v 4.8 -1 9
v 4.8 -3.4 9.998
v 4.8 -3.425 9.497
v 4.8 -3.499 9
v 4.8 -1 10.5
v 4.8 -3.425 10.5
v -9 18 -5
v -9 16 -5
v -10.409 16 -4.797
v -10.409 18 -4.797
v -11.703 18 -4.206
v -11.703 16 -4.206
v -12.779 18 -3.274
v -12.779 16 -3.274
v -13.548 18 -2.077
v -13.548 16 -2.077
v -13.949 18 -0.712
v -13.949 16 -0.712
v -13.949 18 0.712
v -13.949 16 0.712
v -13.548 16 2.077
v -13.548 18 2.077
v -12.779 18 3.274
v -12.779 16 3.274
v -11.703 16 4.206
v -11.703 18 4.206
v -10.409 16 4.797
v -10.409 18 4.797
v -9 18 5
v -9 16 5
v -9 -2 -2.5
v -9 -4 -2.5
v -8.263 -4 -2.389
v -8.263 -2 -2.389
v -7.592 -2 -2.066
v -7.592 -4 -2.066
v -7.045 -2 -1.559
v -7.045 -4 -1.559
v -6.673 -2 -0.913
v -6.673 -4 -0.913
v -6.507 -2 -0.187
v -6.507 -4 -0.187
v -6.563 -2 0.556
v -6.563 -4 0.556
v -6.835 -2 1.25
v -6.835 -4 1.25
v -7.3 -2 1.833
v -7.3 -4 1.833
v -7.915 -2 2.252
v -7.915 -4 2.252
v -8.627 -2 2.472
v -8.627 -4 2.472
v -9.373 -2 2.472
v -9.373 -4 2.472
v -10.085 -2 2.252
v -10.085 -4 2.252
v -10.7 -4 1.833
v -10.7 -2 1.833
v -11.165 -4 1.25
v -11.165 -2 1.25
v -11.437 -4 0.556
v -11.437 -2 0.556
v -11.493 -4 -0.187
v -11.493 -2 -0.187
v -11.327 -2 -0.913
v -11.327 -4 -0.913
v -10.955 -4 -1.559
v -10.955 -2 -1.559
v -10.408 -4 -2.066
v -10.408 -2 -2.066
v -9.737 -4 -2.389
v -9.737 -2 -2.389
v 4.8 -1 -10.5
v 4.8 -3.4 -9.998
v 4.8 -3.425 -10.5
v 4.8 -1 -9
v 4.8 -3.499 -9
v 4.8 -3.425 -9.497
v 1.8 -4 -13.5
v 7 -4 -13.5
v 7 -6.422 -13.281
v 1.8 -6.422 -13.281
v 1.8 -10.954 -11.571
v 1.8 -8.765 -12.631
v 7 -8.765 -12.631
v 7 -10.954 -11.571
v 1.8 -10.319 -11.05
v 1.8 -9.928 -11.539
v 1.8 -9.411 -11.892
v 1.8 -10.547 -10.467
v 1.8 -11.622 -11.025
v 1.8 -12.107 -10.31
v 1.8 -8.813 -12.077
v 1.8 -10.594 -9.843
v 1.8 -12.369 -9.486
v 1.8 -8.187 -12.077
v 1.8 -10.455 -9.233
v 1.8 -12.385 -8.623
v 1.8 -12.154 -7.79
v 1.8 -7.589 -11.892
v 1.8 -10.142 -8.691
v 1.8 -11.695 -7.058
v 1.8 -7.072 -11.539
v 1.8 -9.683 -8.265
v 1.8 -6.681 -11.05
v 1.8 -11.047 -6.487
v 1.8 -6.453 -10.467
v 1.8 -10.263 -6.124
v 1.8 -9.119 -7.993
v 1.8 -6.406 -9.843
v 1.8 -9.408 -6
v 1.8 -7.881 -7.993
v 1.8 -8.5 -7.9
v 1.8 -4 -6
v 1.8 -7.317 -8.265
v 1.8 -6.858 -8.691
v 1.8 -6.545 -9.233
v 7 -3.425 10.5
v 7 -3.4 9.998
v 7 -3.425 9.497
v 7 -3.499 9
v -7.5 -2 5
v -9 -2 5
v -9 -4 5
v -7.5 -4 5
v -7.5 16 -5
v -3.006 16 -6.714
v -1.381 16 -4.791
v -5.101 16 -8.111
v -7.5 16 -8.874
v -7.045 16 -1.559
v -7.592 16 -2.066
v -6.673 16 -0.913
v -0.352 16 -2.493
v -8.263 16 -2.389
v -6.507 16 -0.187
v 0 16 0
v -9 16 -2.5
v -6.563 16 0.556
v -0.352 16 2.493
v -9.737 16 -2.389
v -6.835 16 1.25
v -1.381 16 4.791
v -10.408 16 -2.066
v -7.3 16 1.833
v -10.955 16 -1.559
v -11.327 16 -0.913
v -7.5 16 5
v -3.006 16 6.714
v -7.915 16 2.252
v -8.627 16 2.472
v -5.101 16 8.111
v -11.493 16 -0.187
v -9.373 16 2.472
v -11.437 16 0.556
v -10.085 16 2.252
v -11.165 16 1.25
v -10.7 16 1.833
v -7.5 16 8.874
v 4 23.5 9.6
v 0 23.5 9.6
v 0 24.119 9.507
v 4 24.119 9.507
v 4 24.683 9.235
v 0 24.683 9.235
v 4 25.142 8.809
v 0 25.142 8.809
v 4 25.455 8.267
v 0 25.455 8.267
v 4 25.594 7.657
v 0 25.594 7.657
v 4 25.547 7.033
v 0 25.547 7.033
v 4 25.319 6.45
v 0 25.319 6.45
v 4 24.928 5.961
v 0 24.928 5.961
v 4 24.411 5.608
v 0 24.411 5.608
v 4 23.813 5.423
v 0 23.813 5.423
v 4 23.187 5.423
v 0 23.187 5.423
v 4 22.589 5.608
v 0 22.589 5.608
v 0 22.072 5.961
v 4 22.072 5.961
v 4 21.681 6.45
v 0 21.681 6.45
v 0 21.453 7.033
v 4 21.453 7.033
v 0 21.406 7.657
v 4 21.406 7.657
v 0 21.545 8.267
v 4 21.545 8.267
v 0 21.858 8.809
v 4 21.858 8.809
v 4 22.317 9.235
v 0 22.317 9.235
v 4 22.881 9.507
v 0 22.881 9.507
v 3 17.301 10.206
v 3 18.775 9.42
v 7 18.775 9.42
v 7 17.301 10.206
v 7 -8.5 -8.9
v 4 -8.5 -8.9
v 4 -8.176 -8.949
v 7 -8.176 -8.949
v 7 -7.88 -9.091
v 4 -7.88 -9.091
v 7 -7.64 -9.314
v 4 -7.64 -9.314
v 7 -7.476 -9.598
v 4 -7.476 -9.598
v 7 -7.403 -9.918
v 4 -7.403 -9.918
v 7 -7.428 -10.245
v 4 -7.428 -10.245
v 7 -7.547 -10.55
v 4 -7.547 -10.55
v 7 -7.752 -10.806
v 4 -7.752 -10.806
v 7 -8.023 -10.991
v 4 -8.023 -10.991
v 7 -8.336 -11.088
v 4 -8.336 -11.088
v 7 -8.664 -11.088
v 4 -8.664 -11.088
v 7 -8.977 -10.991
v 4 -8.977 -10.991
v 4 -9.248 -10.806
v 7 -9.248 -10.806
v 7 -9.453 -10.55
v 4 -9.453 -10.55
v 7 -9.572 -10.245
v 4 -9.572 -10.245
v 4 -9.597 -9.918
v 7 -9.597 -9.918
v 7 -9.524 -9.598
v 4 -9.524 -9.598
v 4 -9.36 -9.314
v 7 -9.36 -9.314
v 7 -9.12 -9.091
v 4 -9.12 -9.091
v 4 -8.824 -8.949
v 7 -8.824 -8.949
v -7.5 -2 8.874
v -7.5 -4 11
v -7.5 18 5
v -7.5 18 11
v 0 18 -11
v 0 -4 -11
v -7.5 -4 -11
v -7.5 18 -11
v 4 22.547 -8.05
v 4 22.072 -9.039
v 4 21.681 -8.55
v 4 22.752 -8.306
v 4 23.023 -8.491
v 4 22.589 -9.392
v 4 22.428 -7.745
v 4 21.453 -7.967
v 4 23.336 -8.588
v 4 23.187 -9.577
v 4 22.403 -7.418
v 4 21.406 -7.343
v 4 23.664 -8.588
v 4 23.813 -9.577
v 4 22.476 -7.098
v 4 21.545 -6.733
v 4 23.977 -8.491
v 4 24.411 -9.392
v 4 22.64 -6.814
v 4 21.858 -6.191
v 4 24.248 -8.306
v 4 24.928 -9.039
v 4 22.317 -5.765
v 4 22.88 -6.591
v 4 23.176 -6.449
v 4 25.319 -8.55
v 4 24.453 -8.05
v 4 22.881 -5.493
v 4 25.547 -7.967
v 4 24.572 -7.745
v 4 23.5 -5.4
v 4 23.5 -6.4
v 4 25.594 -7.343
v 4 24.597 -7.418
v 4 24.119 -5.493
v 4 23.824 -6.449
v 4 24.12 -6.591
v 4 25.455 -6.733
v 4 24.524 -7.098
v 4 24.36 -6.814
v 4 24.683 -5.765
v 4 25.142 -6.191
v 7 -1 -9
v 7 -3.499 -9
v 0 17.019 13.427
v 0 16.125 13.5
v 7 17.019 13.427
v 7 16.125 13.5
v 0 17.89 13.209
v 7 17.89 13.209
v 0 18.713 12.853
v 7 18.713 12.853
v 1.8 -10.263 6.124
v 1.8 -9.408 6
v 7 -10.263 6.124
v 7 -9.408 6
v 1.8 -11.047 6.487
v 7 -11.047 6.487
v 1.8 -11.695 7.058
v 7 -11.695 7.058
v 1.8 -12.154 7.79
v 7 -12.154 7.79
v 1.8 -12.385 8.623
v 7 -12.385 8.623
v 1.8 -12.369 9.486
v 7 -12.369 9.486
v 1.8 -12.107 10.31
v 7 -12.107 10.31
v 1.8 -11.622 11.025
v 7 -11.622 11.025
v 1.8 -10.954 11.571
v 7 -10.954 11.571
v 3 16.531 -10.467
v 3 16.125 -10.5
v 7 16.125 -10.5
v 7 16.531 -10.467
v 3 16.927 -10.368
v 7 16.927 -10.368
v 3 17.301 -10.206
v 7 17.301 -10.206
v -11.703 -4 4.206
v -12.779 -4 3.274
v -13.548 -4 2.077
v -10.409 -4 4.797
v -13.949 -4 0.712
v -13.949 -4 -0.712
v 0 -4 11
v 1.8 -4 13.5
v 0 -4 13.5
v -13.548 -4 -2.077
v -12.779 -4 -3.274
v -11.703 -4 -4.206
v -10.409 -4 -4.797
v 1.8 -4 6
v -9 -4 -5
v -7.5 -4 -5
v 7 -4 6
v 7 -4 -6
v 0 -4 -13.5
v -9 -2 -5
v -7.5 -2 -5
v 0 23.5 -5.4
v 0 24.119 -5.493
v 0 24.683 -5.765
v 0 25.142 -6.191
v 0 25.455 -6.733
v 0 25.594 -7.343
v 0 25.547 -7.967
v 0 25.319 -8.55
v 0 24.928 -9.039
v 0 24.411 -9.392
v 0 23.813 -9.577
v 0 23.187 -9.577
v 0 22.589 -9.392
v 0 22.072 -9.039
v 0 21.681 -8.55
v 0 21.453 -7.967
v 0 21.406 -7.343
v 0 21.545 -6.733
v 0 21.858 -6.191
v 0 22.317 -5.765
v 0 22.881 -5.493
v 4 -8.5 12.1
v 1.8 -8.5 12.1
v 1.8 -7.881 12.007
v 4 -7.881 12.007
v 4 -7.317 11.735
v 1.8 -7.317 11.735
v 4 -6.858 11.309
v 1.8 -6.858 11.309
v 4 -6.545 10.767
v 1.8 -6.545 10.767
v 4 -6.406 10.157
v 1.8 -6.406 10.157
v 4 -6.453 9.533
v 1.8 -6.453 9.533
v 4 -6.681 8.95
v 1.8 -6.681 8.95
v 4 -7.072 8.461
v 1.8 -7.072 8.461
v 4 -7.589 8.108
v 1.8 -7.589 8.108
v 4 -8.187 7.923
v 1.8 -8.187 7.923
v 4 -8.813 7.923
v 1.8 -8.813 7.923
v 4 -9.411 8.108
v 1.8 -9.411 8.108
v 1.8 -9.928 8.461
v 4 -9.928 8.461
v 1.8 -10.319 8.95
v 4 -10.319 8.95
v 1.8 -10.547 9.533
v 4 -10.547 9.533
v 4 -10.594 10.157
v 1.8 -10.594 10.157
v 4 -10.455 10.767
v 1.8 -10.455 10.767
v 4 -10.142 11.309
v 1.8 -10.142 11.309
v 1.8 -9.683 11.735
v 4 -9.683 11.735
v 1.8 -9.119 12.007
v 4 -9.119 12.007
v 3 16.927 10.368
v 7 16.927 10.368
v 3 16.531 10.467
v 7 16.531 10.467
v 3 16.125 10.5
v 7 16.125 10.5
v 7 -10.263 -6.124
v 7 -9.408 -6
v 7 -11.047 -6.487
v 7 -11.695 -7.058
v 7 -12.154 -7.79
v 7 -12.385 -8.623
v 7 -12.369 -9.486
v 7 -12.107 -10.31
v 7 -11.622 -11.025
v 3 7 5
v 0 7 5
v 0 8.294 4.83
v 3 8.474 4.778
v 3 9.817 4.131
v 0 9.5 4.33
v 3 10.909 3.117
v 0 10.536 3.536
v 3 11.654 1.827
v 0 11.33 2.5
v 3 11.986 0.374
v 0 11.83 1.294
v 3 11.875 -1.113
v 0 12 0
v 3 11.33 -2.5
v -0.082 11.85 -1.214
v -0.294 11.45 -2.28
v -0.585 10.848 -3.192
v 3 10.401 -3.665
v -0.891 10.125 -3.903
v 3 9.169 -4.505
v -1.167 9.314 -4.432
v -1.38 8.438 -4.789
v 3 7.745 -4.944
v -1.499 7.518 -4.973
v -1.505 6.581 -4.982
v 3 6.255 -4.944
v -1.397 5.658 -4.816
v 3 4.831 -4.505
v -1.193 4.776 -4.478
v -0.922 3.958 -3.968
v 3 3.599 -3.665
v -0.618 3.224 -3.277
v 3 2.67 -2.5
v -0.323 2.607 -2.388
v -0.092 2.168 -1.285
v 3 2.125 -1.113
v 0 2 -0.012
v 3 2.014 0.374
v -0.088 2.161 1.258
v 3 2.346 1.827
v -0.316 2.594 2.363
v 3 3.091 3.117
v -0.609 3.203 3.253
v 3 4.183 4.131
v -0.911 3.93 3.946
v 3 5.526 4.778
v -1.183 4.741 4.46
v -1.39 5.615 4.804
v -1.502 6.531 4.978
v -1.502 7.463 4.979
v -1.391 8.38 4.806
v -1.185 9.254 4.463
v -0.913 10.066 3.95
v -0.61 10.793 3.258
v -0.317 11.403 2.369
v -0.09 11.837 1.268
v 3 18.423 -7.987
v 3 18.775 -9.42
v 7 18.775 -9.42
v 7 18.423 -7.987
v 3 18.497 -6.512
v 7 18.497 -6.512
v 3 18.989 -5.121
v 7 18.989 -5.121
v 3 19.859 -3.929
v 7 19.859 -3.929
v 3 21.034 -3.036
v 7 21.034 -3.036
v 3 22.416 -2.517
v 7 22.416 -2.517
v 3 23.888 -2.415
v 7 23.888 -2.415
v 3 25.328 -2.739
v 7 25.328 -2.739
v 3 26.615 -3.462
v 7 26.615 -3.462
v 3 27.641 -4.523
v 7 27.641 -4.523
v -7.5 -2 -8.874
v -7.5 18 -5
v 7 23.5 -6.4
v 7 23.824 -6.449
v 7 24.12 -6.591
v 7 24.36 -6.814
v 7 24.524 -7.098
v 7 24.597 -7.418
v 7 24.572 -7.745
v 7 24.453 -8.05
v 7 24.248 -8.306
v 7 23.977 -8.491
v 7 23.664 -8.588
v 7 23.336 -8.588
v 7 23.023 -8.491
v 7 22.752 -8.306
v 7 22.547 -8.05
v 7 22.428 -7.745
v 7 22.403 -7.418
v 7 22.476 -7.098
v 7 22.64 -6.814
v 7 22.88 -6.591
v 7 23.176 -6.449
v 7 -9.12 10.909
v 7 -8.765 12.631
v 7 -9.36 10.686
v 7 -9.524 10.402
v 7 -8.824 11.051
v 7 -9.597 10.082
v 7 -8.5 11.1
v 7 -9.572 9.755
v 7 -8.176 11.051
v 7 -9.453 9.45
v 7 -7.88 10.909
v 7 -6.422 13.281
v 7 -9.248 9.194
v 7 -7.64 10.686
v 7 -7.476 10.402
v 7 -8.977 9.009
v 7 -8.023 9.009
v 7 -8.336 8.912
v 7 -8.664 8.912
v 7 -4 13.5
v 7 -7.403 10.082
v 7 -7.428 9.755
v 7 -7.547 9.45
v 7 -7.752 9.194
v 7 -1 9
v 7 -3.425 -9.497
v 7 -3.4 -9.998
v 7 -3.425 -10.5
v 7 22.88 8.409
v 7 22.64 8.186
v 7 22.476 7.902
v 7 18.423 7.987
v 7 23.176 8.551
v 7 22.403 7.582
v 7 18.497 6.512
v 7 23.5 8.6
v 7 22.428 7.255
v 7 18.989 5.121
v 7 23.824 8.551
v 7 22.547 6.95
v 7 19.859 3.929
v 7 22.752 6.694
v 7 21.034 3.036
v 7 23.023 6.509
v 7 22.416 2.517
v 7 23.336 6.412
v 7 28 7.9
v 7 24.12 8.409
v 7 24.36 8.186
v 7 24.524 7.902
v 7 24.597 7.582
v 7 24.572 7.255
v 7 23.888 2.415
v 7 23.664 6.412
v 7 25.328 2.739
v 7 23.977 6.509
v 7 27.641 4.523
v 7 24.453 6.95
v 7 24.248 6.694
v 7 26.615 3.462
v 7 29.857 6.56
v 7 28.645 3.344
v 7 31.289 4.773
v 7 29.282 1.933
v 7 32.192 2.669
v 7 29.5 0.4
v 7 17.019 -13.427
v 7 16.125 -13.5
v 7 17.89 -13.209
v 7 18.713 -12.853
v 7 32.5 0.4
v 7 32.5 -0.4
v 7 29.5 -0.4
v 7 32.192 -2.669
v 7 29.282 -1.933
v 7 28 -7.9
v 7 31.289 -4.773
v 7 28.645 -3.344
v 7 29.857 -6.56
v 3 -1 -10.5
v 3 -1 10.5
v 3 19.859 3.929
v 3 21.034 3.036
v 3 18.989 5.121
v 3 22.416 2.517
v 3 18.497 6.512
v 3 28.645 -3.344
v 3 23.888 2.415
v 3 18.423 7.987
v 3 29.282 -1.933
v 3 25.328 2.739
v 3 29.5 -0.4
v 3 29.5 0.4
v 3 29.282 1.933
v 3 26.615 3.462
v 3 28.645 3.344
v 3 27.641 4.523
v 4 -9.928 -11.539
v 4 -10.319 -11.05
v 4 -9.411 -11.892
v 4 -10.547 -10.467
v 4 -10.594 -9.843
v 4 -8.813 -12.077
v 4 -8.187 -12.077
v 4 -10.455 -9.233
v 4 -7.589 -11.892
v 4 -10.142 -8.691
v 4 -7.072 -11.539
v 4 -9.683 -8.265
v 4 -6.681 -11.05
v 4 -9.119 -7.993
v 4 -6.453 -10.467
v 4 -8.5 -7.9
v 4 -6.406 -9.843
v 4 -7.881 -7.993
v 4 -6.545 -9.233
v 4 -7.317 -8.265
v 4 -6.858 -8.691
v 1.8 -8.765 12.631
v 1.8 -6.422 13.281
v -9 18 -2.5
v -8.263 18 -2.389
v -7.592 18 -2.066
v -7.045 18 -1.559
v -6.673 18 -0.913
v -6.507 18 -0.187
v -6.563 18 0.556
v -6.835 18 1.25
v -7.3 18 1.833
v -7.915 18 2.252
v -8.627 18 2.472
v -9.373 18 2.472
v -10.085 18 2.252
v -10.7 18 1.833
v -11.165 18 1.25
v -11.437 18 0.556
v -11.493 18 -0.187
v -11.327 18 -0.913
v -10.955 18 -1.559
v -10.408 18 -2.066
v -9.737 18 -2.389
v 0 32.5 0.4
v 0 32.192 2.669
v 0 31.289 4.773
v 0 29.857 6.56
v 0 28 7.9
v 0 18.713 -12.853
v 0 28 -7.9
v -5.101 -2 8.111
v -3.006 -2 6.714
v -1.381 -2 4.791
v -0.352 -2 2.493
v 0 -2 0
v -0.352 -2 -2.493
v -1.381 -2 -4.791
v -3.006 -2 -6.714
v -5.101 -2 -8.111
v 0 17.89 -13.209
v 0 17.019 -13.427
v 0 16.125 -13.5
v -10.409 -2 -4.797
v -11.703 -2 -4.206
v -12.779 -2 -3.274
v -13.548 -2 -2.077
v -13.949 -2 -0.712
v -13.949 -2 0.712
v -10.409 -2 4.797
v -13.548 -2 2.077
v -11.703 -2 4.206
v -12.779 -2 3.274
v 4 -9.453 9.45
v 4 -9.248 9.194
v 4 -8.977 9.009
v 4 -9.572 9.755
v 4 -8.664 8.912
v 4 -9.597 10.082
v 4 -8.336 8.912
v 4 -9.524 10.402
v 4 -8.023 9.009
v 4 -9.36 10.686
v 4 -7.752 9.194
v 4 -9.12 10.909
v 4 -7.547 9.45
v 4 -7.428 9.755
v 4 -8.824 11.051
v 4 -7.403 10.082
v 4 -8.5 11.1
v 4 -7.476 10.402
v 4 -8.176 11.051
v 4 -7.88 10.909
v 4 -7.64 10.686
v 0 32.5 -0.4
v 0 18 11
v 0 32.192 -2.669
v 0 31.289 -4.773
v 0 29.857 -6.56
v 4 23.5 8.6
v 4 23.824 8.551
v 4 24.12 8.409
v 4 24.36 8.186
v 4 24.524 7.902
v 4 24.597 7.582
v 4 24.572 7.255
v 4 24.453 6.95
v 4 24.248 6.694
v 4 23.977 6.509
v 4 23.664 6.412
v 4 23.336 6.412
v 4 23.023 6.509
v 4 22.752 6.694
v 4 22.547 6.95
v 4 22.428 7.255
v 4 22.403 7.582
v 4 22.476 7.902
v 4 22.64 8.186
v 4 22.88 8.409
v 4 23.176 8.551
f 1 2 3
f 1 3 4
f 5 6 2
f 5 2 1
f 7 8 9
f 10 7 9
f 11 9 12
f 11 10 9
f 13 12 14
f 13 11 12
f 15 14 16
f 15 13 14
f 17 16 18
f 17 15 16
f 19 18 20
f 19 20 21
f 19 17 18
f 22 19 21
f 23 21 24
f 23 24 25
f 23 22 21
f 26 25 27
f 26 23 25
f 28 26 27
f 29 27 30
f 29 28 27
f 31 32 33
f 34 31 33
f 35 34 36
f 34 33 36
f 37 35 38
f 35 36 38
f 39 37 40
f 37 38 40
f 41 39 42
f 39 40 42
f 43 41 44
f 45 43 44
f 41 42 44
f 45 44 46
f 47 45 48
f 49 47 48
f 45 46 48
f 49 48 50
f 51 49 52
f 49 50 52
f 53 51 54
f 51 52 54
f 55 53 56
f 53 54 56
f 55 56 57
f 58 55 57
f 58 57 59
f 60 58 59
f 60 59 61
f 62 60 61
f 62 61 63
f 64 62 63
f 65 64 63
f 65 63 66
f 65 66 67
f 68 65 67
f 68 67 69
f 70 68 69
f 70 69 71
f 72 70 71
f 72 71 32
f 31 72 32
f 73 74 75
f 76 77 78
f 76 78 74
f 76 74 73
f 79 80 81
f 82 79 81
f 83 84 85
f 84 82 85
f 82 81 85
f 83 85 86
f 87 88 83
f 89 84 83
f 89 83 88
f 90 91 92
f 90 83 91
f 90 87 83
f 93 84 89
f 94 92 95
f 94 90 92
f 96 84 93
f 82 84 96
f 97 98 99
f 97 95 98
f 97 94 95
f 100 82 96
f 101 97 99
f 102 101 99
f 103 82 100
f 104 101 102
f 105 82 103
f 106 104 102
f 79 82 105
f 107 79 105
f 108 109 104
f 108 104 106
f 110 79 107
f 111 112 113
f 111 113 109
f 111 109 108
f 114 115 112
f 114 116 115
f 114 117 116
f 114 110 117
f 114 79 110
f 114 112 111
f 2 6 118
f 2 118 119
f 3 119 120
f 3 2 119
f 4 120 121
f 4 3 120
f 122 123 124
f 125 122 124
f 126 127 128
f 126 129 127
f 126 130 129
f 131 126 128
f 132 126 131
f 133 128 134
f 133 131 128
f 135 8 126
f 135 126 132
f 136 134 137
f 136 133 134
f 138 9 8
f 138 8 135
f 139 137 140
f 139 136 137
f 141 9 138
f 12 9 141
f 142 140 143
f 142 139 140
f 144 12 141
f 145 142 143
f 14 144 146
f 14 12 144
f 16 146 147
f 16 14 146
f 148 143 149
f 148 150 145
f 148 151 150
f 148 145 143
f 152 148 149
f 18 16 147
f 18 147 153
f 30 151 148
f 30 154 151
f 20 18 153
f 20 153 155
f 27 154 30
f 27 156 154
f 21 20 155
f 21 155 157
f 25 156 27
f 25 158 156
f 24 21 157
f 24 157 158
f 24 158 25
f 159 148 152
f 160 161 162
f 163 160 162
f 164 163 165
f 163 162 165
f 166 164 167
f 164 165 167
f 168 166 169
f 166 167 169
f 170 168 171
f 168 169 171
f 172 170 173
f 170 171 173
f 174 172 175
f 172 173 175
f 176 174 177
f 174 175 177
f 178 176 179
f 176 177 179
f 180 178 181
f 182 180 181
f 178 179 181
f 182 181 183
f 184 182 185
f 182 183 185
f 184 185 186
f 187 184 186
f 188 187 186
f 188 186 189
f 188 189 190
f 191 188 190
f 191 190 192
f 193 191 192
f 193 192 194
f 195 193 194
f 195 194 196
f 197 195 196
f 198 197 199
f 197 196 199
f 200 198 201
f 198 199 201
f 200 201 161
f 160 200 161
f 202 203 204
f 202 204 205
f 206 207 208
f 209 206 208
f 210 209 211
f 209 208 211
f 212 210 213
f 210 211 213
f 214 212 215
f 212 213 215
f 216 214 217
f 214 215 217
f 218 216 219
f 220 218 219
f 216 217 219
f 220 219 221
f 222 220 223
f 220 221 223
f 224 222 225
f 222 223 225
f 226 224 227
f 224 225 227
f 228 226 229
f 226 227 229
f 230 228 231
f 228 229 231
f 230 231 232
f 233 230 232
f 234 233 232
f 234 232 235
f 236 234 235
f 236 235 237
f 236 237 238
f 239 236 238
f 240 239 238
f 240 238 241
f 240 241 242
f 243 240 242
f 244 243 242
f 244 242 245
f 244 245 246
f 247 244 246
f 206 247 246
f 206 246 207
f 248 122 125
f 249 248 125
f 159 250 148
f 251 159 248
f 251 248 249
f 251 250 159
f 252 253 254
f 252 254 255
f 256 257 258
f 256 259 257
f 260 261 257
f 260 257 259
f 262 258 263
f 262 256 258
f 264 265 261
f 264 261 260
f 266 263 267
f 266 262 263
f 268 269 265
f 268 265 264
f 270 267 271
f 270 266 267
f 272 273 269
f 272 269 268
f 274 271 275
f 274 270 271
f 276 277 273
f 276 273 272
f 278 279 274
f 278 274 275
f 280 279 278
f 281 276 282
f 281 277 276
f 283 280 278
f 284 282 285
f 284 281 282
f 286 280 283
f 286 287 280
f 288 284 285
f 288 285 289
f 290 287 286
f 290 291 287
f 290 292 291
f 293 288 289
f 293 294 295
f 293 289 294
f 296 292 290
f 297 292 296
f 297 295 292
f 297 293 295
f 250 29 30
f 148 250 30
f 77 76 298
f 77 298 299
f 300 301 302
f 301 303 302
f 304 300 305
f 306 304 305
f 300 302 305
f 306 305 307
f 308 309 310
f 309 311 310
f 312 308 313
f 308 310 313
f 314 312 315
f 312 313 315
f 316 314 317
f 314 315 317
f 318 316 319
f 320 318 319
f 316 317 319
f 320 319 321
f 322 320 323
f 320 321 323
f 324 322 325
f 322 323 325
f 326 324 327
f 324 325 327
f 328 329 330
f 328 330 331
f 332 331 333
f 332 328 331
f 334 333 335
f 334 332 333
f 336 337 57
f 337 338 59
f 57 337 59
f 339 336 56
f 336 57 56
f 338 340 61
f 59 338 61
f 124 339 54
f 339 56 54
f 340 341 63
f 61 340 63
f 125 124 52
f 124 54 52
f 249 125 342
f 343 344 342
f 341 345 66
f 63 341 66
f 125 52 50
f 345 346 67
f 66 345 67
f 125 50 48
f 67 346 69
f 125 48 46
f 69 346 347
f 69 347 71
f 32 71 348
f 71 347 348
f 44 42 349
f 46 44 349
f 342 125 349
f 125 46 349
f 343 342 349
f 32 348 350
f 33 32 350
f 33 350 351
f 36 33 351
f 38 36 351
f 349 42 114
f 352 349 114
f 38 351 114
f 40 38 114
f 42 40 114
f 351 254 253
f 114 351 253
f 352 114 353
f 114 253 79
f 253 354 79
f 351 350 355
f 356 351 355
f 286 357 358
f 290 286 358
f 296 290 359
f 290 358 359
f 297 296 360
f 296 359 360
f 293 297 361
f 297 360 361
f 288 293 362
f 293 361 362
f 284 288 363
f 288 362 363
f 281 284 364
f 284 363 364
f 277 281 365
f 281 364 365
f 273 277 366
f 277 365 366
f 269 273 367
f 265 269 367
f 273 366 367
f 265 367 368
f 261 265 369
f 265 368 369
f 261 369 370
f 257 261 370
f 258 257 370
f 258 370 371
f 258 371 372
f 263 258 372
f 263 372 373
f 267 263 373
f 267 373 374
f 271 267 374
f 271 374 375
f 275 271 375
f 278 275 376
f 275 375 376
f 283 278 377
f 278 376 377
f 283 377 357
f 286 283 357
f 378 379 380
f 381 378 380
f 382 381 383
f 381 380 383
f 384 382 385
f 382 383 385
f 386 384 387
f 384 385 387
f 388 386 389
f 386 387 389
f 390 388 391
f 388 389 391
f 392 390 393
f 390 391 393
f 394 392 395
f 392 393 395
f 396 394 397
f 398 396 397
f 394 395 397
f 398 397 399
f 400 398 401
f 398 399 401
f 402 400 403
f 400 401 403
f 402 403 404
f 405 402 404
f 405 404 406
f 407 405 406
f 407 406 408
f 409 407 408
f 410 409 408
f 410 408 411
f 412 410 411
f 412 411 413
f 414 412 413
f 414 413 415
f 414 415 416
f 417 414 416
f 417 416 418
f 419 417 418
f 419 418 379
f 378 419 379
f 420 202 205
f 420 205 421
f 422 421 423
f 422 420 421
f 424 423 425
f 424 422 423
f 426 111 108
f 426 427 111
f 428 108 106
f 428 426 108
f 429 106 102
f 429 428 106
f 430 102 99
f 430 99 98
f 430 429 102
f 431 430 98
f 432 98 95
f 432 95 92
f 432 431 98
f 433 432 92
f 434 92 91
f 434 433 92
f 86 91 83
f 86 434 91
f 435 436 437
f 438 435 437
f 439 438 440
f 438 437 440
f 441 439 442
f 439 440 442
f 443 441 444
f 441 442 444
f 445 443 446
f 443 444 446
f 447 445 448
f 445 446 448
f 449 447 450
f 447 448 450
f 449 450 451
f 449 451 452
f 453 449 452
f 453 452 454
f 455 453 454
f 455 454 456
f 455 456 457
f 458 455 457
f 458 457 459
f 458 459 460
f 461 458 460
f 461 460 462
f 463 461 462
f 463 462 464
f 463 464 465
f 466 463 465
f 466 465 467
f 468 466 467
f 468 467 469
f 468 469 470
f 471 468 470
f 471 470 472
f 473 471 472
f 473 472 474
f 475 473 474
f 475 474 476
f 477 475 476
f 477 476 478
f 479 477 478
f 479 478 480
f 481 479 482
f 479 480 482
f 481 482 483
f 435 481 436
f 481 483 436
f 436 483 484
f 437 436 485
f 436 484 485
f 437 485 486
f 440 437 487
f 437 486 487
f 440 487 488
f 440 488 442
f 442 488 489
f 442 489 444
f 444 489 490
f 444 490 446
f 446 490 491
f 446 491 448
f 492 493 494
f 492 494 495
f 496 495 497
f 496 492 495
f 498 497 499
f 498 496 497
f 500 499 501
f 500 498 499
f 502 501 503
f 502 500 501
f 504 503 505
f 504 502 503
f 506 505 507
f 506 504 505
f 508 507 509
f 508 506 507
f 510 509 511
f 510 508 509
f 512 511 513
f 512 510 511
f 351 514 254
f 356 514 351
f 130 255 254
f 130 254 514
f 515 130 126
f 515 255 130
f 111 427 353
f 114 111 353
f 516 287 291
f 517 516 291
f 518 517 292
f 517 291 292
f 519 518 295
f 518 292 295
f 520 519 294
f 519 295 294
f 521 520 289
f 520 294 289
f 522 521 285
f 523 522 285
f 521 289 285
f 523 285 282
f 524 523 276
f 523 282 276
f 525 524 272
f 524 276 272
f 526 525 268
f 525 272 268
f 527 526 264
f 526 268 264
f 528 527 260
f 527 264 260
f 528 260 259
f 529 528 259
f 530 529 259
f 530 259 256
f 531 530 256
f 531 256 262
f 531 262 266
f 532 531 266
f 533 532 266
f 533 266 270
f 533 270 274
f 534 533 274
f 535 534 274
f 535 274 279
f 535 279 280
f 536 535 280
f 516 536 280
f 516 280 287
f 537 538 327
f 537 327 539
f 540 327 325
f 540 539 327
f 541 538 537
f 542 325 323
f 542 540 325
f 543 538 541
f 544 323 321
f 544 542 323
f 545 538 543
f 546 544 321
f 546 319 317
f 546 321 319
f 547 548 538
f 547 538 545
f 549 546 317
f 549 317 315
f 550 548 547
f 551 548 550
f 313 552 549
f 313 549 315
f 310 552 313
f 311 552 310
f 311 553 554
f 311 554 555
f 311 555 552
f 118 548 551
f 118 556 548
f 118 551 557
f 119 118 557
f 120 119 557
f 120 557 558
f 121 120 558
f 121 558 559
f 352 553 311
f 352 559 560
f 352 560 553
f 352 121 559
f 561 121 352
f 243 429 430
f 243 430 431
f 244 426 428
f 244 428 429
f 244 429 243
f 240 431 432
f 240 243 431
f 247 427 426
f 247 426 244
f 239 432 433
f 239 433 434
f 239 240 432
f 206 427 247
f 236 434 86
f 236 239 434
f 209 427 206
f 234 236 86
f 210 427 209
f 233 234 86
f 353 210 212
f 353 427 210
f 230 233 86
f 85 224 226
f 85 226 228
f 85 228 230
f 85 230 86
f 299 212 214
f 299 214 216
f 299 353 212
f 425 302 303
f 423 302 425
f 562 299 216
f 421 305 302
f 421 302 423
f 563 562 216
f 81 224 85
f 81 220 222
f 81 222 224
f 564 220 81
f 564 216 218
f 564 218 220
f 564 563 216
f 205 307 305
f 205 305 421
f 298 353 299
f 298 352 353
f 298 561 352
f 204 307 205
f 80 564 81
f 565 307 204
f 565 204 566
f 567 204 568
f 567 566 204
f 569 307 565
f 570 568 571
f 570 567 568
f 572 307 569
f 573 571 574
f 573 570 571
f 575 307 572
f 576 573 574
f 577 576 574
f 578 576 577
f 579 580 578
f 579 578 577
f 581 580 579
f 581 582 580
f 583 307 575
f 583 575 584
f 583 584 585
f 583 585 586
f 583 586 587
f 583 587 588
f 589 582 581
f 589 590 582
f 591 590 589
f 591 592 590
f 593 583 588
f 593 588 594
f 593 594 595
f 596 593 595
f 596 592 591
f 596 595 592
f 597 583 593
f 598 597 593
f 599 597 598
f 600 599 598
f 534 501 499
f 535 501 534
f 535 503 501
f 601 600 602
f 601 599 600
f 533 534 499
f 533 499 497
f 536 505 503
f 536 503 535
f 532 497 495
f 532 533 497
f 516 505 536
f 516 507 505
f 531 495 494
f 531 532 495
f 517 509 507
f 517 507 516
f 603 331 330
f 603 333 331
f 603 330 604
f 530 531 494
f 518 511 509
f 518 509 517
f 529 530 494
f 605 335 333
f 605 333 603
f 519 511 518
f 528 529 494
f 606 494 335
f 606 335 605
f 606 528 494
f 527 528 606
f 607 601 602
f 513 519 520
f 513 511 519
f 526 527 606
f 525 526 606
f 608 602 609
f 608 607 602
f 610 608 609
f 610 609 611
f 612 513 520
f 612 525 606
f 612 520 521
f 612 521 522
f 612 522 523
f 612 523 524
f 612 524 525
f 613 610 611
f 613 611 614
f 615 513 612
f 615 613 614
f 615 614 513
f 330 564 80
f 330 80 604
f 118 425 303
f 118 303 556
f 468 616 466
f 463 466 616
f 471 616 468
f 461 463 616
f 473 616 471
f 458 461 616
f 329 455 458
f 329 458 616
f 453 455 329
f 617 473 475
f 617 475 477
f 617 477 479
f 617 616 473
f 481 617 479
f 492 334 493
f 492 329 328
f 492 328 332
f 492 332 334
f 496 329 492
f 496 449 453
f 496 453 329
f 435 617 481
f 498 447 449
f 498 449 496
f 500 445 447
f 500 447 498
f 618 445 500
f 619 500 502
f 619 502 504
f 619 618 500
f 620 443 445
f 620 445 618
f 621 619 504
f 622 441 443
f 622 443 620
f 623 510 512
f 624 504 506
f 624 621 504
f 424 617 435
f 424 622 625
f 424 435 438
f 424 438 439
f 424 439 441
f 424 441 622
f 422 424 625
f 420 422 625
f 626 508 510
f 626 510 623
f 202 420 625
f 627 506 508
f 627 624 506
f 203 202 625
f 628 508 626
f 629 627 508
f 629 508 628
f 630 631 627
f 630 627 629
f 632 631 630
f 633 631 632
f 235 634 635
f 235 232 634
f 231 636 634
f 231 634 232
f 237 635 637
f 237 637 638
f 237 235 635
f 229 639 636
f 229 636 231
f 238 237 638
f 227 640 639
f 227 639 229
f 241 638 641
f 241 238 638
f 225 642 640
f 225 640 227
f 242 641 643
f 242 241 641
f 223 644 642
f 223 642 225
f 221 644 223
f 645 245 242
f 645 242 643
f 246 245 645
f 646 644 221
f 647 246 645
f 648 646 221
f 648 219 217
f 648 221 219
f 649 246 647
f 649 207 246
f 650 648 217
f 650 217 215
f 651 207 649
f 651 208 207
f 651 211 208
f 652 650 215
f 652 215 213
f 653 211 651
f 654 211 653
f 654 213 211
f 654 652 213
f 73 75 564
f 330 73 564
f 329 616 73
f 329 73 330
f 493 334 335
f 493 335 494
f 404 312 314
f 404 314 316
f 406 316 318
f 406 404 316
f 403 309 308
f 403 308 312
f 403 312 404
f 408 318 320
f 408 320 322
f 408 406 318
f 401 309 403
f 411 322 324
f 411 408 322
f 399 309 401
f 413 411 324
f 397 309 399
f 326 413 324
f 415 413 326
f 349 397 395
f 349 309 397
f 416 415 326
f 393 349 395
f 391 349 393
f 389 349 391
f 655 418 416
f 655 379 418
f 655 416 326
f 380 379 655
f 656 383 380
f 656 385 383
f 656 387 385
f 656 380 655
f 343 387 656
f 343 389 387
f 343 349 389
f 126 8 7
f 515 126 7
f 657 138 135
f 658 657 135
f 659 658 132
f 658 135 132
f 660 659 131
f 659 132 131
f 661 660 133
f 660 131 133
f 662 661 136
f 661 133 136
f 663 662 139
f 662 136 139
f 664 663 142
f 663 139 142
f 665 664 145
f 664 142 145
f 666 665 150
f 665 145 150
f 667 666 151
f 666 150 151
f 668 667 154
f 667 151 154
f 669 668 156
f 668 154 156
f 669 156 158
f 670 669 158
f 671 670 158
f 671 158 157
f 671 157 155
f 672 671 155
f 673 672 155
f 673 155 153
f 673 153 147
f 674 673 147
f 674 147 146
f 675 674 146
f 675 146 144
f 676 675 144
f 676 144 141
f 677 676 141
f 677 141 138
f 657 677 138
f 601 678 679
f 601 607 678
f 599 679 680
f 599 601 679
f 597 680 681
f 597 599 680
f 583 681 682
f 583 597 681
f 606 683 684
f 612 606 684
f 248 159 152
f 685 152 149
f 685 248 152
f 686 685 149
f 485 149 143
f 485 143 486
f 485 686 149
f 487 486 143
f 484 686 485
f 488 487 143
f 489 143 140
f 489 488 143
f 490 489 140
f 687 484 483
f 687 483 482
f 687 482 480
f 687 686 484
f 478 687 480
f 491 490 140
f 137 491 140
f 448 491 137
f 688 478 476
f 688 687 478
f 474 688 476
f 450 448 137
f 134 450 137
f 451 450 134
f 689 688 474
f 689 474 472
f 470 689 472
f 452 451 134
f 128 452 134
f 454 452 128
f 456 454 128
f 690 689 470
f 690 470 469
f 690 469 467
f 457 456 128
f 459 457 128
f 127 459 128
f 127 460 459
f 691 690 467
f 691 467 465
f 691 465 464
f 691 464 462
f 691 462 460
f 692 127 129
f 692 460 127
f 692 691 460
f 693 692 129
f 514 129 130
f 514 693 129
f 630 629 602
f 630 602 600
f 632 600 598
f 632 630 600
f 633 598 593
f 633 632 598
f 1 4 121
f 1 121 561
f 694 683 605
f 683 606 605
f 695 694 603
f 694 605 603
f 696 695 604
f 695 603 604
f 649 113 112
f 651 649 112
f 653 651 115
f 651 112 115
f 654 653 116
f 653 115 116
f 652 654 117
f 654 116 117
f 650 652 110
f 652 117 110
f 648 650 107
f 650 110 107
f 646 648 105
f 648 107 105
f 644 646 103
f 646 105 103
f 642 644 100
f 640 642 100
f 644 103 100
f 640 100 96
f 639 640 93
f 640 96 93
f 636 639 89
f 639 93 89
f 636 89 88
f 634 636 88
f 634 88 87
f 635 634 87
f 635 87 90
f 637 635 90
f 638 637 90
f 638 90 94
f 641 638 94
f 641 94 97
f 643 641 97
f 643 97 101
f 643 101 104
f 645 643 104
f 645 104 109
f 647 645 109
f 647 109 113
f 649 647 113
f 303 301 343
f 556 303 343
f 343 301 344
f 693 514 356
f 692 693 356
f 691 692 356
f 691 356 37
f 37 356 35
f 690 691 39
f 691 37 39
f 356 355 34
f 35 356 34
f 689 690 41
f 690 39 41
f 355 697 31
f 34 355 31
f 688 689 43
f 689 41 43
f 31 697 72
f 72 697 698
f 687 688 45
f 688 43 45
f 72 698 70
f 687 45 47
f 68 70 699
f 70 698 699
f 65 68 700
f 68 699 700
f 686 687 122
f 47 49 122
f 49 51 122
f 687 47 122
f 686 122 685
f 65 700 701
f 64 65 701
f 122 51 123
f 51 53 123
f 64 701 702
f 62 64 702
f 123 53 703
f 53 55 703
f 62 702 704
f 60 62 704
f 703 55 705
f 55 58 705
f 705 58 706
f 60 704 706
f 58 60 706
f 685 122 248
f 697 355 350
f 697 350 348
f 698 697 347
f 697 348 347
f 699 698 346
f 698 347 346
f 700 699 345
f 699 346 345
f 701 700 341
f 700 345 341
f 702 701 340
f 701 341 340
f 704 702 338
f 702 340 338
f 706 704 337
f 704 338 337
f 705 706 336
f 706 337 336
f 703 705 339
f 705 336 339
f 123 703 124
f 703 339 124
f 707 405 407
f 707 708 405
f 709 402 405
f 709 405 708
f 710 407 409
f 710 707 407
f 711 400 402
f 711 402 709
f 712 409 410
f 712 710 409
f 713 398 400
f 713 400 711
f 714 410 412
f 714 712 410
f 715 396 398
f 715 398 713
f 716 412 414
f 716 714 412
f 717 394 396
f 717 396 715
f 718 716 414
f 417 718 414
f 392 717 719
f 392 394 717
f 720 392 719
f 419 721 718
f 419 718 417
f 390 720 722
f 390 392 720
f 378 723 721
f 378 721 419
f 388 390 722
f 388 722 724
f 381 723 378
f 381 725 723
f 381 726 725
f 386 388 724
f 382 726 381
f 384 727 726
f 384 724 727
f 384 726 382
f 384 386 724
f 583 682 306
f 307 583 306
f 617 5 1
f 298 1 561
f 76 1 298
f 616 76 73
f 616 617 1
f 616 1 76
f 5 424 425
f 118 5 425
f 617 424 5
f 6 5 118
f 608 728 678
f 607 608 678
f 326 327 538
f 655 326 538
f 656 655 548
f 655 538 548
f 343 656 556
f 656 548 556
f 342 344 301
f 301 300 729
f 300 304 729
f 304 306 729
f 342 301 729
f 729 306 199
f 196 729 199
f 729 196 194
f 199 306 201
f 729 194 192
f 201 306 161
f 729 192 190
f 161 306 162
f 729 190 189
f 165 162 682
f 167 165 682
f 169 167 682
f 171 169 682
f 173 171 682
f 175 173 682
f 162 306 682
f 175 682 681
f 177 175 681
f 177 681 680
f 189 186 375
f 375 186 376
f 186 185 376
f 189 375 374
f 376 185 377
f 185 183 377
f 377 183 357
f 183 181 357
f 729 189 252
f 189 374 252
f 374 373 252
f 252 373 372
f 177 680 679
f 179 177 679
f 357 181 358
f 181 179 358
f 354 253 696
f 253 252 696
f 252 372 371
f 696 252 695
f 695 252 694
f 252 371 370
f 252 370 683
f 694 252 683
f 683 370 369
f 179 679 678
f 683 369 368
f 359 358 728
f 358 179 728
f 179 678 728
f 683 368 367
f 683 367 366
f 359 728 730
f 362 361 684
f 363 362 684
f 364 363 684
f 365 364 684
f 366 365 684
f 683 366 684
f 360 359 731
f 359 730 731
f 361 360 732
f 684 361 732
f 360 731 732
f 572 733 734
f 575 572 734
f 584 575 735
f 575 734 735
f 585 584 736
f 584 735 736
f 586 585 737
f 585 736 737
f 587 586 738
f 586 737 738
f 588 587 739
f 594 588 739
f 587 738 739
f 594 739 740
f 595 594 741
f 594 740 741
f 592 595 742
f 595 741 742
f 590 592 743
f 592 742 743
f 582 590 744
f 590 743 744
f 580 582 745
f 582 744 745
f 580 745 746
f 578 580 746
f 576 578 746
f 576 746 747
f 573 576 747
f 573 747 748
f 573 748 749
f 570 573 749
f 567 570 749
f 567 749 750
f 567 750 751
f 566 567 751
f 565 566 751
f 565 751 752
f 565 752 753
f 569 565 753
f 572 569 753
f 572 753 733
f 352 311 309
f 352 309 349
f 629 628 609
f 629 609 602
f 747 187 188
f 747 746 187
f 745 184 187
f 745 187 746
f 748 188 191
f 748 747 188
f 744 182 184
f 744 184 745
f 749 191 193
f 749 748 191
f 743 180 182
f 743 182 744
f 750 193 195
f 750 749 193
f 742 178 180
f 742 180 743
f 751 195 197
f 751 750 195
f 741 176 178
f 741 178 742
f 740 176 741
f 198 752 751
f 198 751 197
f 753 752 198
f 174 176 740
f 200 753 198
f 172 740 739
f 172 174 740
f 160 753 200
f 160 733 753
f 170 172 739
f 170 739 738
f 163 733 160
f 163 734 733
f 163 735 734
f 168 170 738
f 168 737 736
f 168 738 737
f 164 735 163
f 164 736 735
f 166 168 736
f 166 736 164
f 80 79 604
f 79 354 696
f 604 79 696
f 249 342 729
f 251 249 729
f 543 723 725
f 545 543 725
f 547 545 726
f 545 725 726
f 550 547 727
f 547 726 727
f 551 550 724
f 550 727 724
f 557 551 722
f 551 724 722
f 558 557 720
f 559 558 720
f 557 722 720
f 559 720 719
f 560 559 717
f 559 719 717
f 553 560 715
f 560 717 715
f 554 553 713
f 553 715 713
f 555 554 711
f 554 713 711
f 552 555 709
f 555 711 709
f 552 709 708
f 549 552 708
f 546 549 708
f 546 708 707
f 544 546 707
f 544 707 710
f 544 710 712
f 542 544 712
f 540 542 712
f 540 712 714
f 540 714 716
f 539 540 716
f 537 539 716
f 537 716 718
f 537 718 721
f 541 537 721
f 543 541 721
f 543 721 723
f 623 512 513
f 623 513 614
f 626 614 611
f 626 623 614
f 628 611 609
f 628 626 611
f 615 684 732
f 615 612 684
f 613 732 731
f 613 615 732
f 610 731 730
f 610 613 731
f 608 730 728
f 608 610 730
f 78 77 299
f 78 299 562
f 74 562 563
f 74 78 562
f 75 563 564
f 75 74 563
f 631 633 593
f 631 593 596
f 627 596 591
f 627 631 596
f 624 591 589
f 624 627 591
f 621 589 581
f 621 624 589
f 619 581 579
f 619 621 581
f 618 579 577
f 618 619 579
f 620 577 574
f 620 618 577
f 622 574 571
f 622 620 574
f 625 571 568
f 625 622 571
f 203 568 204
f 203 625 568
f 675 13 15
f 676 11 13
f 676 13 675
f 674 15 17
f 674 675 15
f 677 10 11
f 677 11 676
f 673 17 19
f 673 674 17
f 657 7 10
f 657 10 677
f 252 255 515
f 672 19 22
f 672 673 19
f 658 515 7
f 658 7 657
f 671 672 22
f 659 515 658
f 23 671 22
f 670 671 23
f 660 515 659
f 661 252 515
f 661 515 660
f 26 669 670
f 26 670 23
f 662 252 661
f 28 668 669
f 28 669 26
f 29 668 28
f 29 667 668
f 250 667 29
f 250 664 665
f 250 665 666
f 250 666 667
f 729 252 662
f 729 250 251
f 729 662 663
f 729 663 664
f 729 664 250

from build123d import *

# Parameters (mm, degrees)
BOSS_EXTRUDE1_DEPTH                  = 7
FILLET1_R                            = 8.5
FILLET2_R                            = 5.5
FILLET3_R                            = 13.5
SKETCH3_W                            = 27
SKETCH3_H                            = 13.5
CUT_EXTRUDE1_DEPTH                   = 1.8
CUT_EXTRUDE5_REACH                   = 37.882
SKETCH12_W                           = 12
SKETCH12_H                           = 13.5
CUT_EXTRUDE6_REACH                   = 37.882
SKETCH13_R                           = 1.1
SKETCH17_R                           = 2.1
CUT_EXTRUDE14_DEPTH                  = 4
FILLET4_R                            = 3
SHELL2_START                         = 3
SHELL2_DEPTH                         = 4
SHELL2_START_2                       = 4.8
SHELL2_2_DEPTH                       = 2.2
SKETCH18_W                           = 22
SKETCH18_H                           = 22
BOSS_EXTRUDE2_DEPTH                  = 9
SKETCH19_W                           = 18
SKETCH19_H                           = 18
CUT_EXTRUDE15_DEPTH                  = 9
SKETCH20_R                           = 5
CUT_EXTRUDE16_DEPTH                  = 3
FILLET5_R                            = 9
SKETCH21_R                           = 5
BOSS_EXTRUDE3_DEPTH                  = 2
CUT_EXTRUDE17_DEPTH                  = 1.5
CUT_EXTRUDE17_DIRECTION_2_REACH      = 40.659
CUT_EXTRUDE17_DIRECTION_2_END_RADIUS = 5
CUT_EXTRUDE18_REACH                  = 43.358
SKETCH23_R                           = 2.5


# Read off the part's stored shape, not the designer's step: Shell2
# Some blends are built 0.0001 mm under size
with BuildPart() as part:
    # Sketch2 → Boss-Extrude1 (new body)
    with BuildSketch(Plane(origin=(0, 0, 0), x_dir=(0, 0, -1), z_dir=(1, 0, 0))):
        Polygon((-13.5, -17.5), (13.5, -17.5), (13.5, 17.5), (5.5, 32.5), (-5.5, 32.5), (-13.5, 17.5), align=None)
    extrude(amount=BOSS_EXTRUDE1_DEPTH)

    # Fillet1
    fillet1_edges = [part.edges().sort_by_distance(p)[0] for p in [
        (3.5, 32.5, 5.5),
        (3.5, 32.5, -5.5),
    ]]
    fillet(fillet1_edges, radius=FILLET1_R)

    # Fillet2
    fillet2_edges = [part.edges().sort_by_distance(p)[0] for p in [
        (3.5, 17.5, -13.5),
        (3.5, 17.5, 13.5),
    ]]
    fillet(fillet2_edges, radius=FILLET2_R)

    # Fillet3
    fillet3_edges = [part.edges().sort_by_distance(p)[0] for p in [
        (3.5, -17.5, 13.5),
        (3.5, -17.5, -13.5),
    ]]
    fillet(fillet3_edges, radius=FILLET3_R - 0.0001)  # a hair under: the kernel refuses the full size

    # Sketch3 → Cut-Extrude1 (cut)
    with BuildSketch(Plane.ZY):
        with Locations((0, -10.75)):
            Rectangle(SKETCH3_W, SKETCH3_H)
    extrude(amount=-CUT_EXTRUDE1_DEPTH, mode=Mode.SUBTRACT)

    # Sketch12 → Cut-Extrude5 (cut, up to next)
    with BuildSketch(Plane(origin=(7, 0, 0), x_dir=(0, 0, -1), z_dir=(1, 0, 0)), mode=Mode.PRIVATE) as cut_extrude5_sk1:
        with Locations((0, -10.75)):
            Rectangle(SKETCH12_W, SKETCH12_H)
    cut_extrude5_tool1 = extrude(cut_extrude5_sk1.sketch, amount=-CUT_EXTRUDE5_REACH, mode=Mode.PRIVATE) & part.part
    add(cut_extrude5_tool1.solids().sort_by_distance((7, -10.75, 0))[0], mode=Mode.SUBTRACT)

    # Sketch13 → Cut-Extrude6 (cut, up to next)
    with BuildSketch(Plane.ZY, mode=Mode.PRIVATE) as cut_extrude6_sk1:
        with Locations((-7.5, 23.5)):
            Circle(SKETCH13_R)
    cut_extrude6_tool1 = extrude(cut_extrude6_sk1.sketch, amount=-CUT_EXTRUDE6_REACH, mode=Mode.PRIVATE) & part.part
    # Sketch13 → Cut-Extrude6 (cut, up to next)
    with BuildSketch(Plane.ZY, mode=Mode.PRIVATE) as cut_extrude6_sk2:
        with Locations((-10, -8.5)):
            Circle(SKETCH13_R)
    cut_extrude6_tool2 = extrude(cut_extrude6_sk2.sketch, amount=-CUT_EXTRUDE6_REACH, mode=Mode.PRIVATE) & part.part
    # Sketch13 → Cut-Extrude6 (cut, up to next)
    with BuildSketch(Plane.ZY, mode=Mode.PRIVATE) as cut_extrude6_sk3:
        with Locations((10, -8.5)):
            Circle(SKETCH13_R)
    cut_extrude6_tool3 = extrude(cut_extrude6_sk3.sketch, amount=-CUT_EXTRUDE6_REACH, mode=Mode.PRIVATE) & part.part
    # Sketch13 → Cut-Extrude6 (cut, up to next)
    with BuildSketch(Plane.ZY, mode=Mode.PRIVATE) as cut_extrude6_sk4:
        with Locations((7.5, 23.5)):
            Circle(SKETCH13_R)
    cut_extrude6_tool4 = extrude(cut_extrude6_sk4.sketch, amount=-CUT_EXTRUDE6_REACH, mode=Mode.PRIVATE) & part.part
    add(cut_extrude6_tool1.solids().sort_by_distance((0, 23.5, -7.5))[0], mode=Mode.SUBTRACT)
    add(cut_extrude6_tool2.solids().sort_by_distance((0, -8.5, -10))[0], mode=Mode.SUBTRACT)
    add(cut_extrude6_tool3.solids().sort_by_distance((0, -8.5, 10))[0], mode=Mode.SUBTRACT)
    add(cut_extrude6_tool4.solids().sort_by_distance((0, 23.5, 7.5))[0], mode=Mode.SUBTRACT)

    # Sketch17 → Cut-Extrude14 (cut)
    with BuildSketch(Plane.ZY):
        with Locations((-7.5, 23.5)):
            Circle(SKETCH17_R)
        with Locations((7.5, 23.5)):
            Circle(SKETCH17_R)
        with Locations((-10, -8.5)):
            Circle(SKETCH17_R)
        with Locations((10, -8.5)):
            Circle(SKETCH17_R)
    extrude(amount=-CUT_EXTRUDE14_DEPTH, mode=Mode.SUBTRACT)

    # Fillet4
    fillet4_edges = [part.edges().sort_by_distance(p)[0] for p in [
        (4.4, -16.093424605, -6),
        (4.4, -16.093424605, 6),
    ]]
    fillet(fillet4_edges, radius=FILLET4_R)

    # Shell2 outline → Shell2 (cut)
    with BuildSketch(Plane.YZ.offset(SHELL2_START)):
        with BuildLine():
            Line((17.301470588, -10.205882353), (18.775176121, -9.419906069))
            ThreePointArc((18.775176121, -9.419906069), (21.033978224, -3.035838645), (27.640649185, -4.522580929))
            ThreePointArc((27.640649185, -4.522580929), (29.013659867, -2.661241858), (29.5, -0.4))
            Line((29.5, -0.4), (29.5, 0.4))
            ThreePointArc((29.5, 0.4), (29.013659867, 2.661241858), (27.640649185, 4.522580929))
            ThreePointArc((27.640649185, 4.522580929), (21.033978224, 3.035838645), (18.775176121, 9.419906069))
            Line((18.775176121, 9.419906069), (17.301470588, 10.205882353))
            ThreePointArc((17.301470588, 10.205882353), (16.731339062, 10.42535625), (16.125, 10.5))
            Line((16.125, 10.5), (-1, 10.5))
            Line((-1, 10.5), (-1, -10.5))
            Line((-1, -10.5), (16.125, -10.5))
            ThreePointArc((16.125, -10.5), (16.731339062, -10.42535625), (17.301470588, -10.205882353))
        make_face()
    extrude(amount=SHELL2_DEPTH, mode=Mode.SUBTRACT)

    # Shell2 2 outline → Shell2 2 (cut)
    with BuildSketch(Plane.YZ.offset(SHELL2_START_2)):
        with BuildLine():
            Line((-3.424568984, -10.5), (-1, -10.5))
            Line((-1, -10.5), (-1, -9))
            Line((-1, -9), (-3.4990001, -9))
            ThreePointArc((-3.4990001, -9), (-3.406267086, -9.747245183), (-3.424568984, -10.5))
        make_face()
        with BuildLine():
            Line((-3.4990001, 9), (-1, 9))
            Line((-1, 9), (-1, 10.5))
            Line((-1, 10.5), (-3.424568984, 10.5))
            ThreePointArc((-3.424568984, 10.5), (-3.406267086, 9.747245183), (-3.4990001, 9))
        make_face()
    extrude(amount=SHELL2_2_DEPTH, mode=Mode.SUBTRACT)

    # Sketch18 → Boss-Extrude2 (add)
    with BuildSketch(Plane.ZY):
        with Locations((0, 7)):
            Rectangle(SKETCH18_W, SKETCH18_H)
    extrude(amount=BOSS_EXTRUDE2_DEPTH)

    # Sketch19 → Cut-Extrude15 (cut)
    with BuildSketch(Plane.ZY.offset(9)):
        with Locations((0, 7)):
            Rectangle(SKETCH19_W, SKETCH19_H)
    extrude(amount=-CUT_EXTRUDE15_DEPTH, mode=Mode.SUBTRACT)

    # Sketch20 → Cut-Extrude16 (cut)
    with BuildSketch(Plane.ZY):
        with Locations((0, 7)):
            Circle(SKETCH20_R)
    extrude(amount=-CUT_EXTRUDE16_DEPTH, mode=Mode.SUBTRACT)

    # Fillet5
    # the kernel refuses this fillet: 9 mm, written as the material it adds along each edge
    with BuildSketch(Plane(origin=(0, 16, -9), x_dir=(-1, 0, 0), z_dir=(0, -1, 0))) as fillet5_piece_1_section:
        with BuildLine():
            CenterArc((FILLET5_R, -FILLET5_R), FILLET5_R, 90, 90)
            Line((0, -FILLET5_R), (0, 0))
            Line((0, 0), (FILLET5_R, 0))
        make_face()
    fillet5_piece_1 = extrude(amount=18, mode=Mode.PRIVATE)
    fillet5_piece_1 = fillet5_piece_1 - Plane(origin=(-0.132604543, 7, 0), x_dir=(0, 0, 1), z_dir=(-1, 0, 0)) * Cylinder(5, 72, mode=Mode.PRIVATE)
    add(fillet5_piece_1)
    with BuildSketch(Plane(origin=(0, -2, 9), x_dir=(-1, 0, 0), z_dir=(0, 1, 0))) as fillet5_piece_2_section:
        with BuildLine():
            CenterArc((FILLET5_R, -FILLET5_R), FILLET5_R, 90, 90)
            Line((0, -FILLET5_R), (0, 0))
            Line((0, 0), (FILLET5_R, 0))
        make_face()
    fillet5_piece_2 = extrude(amount=18, mode=Mode.PRIVATE)
    fillet5_piece_2 = fillet5_piece_2 - Plane(origin=(-2.089358555, 7, 0), x_dir=(0, 0, 1), z_dir=(-1, 0, 0)) * Cylinder(5, 72, mode=Mode.PRIVATE)
    add(fillet5_piece_2)

    # Sketch21 → Boss-Extrude3 (add)
    with BuildSketch(Plane(origin=(0, 18, 0), x_dir=(1, 0, 0), z_dir=(0, 1, 0))):
        with Locations((-9, 0)):
            Circle(SKETCH21_R)
    boss_extrude3 = extrude(amount=-BOSS_EXTRUDE3_DEPTH)

    # Mirror1: Boss-Extrude3 across plane
    add(boss_extrude3.mirror(Plane.ZX.offset(7)))

    # Sketch22 → Cut-Extrude17 (cut)
    with BuildSketch(Plane.ZY.offset(9)):
        Polygon((-5, 16), (-5, 18), (-11, 18), (-11, -4), (-5, -4), (-5, -2), (5, -2), (5, -4), (11, -4), (11, 18), (5, 18), (5, 16), align=None)
    extrude(amount=-CUT_EXTRUDE17_DEPTH, mode=Mode.SUBTRACT)

    # Cut-Extrude17 direction 2: up to this cylinder (the profile starts inside it)
    cut_extrude17_direction_2_end = Plane(origin=(-9, 7, 0), z_dir=(0, 1, 0)) * Cylinder(CUT_EXTRUDE17_DIRECTION_2_END_RADIUS, 92.318, mode=Mode.PRIVATE)
    # Sketch22 → Cut-Extrude17 direction 2 (cut, up to the surface)
    with BuildSketch(Plane.ZY.offset(9), mode=Mode.PRIVATE) as cut_extrude17_direction_2_sk1:
        Polygon((-5, 16), (-5, 18), (-11, 18), (-11, -4), (-5, -4), (-5, -2), (5, -2), (5, -4), (11, -4), (11, 18), (5, 18), (5, 16), align=None)
    cut_extrude17_direction_2_tool1 = extrude(cut_extrude17_direction_2_sk1.sketch, amount=CUT_EXTRUDE17_DIRECTION_2_REACH, mode=Mode.PRIVATE) & cut_extrude17_direction_2_end
    add(cut_extrude17_direction_2_tool1.solids().sort_by_distance((-9, 7, 0))[0], mode=Mode.SUBTRACT)

    # Cut-Extrude18: up to this face of the body (flat: up to its plane)
    cut_extrude18_end = Plane(part.part.faces().sort_by_distance((-5.378131987, 18, 0))[0])
    # Sketch23 → Cut-Extrude18 (cut, up to the picked face)
    with BuildSketch(Plane.XZ.offset(4), mode=Mode.PRIVATE) as cut_extrude18_sk1:
        with Locations(Location((-9, 0, 0), (0, 0, 270))):
            Circle(SKETCH23_R)
    cut_extrude18_tool1 = split(extrude(cut_extrude18_sk1.sketch, amount=-CUT_EXTRUDE18_REACH, mode=Mode.PRIVATE), bisect_by=cut_extrude18_end, keep=Keep.BOTH, mode=Mode.PRIVATE)
    add(cut_extrude18_tool1.solids().sort_by(Axis((-9, -4, 0), (0, 1, 0)))[0], mode=Mode.SUBTRACT)


solid = part.part
